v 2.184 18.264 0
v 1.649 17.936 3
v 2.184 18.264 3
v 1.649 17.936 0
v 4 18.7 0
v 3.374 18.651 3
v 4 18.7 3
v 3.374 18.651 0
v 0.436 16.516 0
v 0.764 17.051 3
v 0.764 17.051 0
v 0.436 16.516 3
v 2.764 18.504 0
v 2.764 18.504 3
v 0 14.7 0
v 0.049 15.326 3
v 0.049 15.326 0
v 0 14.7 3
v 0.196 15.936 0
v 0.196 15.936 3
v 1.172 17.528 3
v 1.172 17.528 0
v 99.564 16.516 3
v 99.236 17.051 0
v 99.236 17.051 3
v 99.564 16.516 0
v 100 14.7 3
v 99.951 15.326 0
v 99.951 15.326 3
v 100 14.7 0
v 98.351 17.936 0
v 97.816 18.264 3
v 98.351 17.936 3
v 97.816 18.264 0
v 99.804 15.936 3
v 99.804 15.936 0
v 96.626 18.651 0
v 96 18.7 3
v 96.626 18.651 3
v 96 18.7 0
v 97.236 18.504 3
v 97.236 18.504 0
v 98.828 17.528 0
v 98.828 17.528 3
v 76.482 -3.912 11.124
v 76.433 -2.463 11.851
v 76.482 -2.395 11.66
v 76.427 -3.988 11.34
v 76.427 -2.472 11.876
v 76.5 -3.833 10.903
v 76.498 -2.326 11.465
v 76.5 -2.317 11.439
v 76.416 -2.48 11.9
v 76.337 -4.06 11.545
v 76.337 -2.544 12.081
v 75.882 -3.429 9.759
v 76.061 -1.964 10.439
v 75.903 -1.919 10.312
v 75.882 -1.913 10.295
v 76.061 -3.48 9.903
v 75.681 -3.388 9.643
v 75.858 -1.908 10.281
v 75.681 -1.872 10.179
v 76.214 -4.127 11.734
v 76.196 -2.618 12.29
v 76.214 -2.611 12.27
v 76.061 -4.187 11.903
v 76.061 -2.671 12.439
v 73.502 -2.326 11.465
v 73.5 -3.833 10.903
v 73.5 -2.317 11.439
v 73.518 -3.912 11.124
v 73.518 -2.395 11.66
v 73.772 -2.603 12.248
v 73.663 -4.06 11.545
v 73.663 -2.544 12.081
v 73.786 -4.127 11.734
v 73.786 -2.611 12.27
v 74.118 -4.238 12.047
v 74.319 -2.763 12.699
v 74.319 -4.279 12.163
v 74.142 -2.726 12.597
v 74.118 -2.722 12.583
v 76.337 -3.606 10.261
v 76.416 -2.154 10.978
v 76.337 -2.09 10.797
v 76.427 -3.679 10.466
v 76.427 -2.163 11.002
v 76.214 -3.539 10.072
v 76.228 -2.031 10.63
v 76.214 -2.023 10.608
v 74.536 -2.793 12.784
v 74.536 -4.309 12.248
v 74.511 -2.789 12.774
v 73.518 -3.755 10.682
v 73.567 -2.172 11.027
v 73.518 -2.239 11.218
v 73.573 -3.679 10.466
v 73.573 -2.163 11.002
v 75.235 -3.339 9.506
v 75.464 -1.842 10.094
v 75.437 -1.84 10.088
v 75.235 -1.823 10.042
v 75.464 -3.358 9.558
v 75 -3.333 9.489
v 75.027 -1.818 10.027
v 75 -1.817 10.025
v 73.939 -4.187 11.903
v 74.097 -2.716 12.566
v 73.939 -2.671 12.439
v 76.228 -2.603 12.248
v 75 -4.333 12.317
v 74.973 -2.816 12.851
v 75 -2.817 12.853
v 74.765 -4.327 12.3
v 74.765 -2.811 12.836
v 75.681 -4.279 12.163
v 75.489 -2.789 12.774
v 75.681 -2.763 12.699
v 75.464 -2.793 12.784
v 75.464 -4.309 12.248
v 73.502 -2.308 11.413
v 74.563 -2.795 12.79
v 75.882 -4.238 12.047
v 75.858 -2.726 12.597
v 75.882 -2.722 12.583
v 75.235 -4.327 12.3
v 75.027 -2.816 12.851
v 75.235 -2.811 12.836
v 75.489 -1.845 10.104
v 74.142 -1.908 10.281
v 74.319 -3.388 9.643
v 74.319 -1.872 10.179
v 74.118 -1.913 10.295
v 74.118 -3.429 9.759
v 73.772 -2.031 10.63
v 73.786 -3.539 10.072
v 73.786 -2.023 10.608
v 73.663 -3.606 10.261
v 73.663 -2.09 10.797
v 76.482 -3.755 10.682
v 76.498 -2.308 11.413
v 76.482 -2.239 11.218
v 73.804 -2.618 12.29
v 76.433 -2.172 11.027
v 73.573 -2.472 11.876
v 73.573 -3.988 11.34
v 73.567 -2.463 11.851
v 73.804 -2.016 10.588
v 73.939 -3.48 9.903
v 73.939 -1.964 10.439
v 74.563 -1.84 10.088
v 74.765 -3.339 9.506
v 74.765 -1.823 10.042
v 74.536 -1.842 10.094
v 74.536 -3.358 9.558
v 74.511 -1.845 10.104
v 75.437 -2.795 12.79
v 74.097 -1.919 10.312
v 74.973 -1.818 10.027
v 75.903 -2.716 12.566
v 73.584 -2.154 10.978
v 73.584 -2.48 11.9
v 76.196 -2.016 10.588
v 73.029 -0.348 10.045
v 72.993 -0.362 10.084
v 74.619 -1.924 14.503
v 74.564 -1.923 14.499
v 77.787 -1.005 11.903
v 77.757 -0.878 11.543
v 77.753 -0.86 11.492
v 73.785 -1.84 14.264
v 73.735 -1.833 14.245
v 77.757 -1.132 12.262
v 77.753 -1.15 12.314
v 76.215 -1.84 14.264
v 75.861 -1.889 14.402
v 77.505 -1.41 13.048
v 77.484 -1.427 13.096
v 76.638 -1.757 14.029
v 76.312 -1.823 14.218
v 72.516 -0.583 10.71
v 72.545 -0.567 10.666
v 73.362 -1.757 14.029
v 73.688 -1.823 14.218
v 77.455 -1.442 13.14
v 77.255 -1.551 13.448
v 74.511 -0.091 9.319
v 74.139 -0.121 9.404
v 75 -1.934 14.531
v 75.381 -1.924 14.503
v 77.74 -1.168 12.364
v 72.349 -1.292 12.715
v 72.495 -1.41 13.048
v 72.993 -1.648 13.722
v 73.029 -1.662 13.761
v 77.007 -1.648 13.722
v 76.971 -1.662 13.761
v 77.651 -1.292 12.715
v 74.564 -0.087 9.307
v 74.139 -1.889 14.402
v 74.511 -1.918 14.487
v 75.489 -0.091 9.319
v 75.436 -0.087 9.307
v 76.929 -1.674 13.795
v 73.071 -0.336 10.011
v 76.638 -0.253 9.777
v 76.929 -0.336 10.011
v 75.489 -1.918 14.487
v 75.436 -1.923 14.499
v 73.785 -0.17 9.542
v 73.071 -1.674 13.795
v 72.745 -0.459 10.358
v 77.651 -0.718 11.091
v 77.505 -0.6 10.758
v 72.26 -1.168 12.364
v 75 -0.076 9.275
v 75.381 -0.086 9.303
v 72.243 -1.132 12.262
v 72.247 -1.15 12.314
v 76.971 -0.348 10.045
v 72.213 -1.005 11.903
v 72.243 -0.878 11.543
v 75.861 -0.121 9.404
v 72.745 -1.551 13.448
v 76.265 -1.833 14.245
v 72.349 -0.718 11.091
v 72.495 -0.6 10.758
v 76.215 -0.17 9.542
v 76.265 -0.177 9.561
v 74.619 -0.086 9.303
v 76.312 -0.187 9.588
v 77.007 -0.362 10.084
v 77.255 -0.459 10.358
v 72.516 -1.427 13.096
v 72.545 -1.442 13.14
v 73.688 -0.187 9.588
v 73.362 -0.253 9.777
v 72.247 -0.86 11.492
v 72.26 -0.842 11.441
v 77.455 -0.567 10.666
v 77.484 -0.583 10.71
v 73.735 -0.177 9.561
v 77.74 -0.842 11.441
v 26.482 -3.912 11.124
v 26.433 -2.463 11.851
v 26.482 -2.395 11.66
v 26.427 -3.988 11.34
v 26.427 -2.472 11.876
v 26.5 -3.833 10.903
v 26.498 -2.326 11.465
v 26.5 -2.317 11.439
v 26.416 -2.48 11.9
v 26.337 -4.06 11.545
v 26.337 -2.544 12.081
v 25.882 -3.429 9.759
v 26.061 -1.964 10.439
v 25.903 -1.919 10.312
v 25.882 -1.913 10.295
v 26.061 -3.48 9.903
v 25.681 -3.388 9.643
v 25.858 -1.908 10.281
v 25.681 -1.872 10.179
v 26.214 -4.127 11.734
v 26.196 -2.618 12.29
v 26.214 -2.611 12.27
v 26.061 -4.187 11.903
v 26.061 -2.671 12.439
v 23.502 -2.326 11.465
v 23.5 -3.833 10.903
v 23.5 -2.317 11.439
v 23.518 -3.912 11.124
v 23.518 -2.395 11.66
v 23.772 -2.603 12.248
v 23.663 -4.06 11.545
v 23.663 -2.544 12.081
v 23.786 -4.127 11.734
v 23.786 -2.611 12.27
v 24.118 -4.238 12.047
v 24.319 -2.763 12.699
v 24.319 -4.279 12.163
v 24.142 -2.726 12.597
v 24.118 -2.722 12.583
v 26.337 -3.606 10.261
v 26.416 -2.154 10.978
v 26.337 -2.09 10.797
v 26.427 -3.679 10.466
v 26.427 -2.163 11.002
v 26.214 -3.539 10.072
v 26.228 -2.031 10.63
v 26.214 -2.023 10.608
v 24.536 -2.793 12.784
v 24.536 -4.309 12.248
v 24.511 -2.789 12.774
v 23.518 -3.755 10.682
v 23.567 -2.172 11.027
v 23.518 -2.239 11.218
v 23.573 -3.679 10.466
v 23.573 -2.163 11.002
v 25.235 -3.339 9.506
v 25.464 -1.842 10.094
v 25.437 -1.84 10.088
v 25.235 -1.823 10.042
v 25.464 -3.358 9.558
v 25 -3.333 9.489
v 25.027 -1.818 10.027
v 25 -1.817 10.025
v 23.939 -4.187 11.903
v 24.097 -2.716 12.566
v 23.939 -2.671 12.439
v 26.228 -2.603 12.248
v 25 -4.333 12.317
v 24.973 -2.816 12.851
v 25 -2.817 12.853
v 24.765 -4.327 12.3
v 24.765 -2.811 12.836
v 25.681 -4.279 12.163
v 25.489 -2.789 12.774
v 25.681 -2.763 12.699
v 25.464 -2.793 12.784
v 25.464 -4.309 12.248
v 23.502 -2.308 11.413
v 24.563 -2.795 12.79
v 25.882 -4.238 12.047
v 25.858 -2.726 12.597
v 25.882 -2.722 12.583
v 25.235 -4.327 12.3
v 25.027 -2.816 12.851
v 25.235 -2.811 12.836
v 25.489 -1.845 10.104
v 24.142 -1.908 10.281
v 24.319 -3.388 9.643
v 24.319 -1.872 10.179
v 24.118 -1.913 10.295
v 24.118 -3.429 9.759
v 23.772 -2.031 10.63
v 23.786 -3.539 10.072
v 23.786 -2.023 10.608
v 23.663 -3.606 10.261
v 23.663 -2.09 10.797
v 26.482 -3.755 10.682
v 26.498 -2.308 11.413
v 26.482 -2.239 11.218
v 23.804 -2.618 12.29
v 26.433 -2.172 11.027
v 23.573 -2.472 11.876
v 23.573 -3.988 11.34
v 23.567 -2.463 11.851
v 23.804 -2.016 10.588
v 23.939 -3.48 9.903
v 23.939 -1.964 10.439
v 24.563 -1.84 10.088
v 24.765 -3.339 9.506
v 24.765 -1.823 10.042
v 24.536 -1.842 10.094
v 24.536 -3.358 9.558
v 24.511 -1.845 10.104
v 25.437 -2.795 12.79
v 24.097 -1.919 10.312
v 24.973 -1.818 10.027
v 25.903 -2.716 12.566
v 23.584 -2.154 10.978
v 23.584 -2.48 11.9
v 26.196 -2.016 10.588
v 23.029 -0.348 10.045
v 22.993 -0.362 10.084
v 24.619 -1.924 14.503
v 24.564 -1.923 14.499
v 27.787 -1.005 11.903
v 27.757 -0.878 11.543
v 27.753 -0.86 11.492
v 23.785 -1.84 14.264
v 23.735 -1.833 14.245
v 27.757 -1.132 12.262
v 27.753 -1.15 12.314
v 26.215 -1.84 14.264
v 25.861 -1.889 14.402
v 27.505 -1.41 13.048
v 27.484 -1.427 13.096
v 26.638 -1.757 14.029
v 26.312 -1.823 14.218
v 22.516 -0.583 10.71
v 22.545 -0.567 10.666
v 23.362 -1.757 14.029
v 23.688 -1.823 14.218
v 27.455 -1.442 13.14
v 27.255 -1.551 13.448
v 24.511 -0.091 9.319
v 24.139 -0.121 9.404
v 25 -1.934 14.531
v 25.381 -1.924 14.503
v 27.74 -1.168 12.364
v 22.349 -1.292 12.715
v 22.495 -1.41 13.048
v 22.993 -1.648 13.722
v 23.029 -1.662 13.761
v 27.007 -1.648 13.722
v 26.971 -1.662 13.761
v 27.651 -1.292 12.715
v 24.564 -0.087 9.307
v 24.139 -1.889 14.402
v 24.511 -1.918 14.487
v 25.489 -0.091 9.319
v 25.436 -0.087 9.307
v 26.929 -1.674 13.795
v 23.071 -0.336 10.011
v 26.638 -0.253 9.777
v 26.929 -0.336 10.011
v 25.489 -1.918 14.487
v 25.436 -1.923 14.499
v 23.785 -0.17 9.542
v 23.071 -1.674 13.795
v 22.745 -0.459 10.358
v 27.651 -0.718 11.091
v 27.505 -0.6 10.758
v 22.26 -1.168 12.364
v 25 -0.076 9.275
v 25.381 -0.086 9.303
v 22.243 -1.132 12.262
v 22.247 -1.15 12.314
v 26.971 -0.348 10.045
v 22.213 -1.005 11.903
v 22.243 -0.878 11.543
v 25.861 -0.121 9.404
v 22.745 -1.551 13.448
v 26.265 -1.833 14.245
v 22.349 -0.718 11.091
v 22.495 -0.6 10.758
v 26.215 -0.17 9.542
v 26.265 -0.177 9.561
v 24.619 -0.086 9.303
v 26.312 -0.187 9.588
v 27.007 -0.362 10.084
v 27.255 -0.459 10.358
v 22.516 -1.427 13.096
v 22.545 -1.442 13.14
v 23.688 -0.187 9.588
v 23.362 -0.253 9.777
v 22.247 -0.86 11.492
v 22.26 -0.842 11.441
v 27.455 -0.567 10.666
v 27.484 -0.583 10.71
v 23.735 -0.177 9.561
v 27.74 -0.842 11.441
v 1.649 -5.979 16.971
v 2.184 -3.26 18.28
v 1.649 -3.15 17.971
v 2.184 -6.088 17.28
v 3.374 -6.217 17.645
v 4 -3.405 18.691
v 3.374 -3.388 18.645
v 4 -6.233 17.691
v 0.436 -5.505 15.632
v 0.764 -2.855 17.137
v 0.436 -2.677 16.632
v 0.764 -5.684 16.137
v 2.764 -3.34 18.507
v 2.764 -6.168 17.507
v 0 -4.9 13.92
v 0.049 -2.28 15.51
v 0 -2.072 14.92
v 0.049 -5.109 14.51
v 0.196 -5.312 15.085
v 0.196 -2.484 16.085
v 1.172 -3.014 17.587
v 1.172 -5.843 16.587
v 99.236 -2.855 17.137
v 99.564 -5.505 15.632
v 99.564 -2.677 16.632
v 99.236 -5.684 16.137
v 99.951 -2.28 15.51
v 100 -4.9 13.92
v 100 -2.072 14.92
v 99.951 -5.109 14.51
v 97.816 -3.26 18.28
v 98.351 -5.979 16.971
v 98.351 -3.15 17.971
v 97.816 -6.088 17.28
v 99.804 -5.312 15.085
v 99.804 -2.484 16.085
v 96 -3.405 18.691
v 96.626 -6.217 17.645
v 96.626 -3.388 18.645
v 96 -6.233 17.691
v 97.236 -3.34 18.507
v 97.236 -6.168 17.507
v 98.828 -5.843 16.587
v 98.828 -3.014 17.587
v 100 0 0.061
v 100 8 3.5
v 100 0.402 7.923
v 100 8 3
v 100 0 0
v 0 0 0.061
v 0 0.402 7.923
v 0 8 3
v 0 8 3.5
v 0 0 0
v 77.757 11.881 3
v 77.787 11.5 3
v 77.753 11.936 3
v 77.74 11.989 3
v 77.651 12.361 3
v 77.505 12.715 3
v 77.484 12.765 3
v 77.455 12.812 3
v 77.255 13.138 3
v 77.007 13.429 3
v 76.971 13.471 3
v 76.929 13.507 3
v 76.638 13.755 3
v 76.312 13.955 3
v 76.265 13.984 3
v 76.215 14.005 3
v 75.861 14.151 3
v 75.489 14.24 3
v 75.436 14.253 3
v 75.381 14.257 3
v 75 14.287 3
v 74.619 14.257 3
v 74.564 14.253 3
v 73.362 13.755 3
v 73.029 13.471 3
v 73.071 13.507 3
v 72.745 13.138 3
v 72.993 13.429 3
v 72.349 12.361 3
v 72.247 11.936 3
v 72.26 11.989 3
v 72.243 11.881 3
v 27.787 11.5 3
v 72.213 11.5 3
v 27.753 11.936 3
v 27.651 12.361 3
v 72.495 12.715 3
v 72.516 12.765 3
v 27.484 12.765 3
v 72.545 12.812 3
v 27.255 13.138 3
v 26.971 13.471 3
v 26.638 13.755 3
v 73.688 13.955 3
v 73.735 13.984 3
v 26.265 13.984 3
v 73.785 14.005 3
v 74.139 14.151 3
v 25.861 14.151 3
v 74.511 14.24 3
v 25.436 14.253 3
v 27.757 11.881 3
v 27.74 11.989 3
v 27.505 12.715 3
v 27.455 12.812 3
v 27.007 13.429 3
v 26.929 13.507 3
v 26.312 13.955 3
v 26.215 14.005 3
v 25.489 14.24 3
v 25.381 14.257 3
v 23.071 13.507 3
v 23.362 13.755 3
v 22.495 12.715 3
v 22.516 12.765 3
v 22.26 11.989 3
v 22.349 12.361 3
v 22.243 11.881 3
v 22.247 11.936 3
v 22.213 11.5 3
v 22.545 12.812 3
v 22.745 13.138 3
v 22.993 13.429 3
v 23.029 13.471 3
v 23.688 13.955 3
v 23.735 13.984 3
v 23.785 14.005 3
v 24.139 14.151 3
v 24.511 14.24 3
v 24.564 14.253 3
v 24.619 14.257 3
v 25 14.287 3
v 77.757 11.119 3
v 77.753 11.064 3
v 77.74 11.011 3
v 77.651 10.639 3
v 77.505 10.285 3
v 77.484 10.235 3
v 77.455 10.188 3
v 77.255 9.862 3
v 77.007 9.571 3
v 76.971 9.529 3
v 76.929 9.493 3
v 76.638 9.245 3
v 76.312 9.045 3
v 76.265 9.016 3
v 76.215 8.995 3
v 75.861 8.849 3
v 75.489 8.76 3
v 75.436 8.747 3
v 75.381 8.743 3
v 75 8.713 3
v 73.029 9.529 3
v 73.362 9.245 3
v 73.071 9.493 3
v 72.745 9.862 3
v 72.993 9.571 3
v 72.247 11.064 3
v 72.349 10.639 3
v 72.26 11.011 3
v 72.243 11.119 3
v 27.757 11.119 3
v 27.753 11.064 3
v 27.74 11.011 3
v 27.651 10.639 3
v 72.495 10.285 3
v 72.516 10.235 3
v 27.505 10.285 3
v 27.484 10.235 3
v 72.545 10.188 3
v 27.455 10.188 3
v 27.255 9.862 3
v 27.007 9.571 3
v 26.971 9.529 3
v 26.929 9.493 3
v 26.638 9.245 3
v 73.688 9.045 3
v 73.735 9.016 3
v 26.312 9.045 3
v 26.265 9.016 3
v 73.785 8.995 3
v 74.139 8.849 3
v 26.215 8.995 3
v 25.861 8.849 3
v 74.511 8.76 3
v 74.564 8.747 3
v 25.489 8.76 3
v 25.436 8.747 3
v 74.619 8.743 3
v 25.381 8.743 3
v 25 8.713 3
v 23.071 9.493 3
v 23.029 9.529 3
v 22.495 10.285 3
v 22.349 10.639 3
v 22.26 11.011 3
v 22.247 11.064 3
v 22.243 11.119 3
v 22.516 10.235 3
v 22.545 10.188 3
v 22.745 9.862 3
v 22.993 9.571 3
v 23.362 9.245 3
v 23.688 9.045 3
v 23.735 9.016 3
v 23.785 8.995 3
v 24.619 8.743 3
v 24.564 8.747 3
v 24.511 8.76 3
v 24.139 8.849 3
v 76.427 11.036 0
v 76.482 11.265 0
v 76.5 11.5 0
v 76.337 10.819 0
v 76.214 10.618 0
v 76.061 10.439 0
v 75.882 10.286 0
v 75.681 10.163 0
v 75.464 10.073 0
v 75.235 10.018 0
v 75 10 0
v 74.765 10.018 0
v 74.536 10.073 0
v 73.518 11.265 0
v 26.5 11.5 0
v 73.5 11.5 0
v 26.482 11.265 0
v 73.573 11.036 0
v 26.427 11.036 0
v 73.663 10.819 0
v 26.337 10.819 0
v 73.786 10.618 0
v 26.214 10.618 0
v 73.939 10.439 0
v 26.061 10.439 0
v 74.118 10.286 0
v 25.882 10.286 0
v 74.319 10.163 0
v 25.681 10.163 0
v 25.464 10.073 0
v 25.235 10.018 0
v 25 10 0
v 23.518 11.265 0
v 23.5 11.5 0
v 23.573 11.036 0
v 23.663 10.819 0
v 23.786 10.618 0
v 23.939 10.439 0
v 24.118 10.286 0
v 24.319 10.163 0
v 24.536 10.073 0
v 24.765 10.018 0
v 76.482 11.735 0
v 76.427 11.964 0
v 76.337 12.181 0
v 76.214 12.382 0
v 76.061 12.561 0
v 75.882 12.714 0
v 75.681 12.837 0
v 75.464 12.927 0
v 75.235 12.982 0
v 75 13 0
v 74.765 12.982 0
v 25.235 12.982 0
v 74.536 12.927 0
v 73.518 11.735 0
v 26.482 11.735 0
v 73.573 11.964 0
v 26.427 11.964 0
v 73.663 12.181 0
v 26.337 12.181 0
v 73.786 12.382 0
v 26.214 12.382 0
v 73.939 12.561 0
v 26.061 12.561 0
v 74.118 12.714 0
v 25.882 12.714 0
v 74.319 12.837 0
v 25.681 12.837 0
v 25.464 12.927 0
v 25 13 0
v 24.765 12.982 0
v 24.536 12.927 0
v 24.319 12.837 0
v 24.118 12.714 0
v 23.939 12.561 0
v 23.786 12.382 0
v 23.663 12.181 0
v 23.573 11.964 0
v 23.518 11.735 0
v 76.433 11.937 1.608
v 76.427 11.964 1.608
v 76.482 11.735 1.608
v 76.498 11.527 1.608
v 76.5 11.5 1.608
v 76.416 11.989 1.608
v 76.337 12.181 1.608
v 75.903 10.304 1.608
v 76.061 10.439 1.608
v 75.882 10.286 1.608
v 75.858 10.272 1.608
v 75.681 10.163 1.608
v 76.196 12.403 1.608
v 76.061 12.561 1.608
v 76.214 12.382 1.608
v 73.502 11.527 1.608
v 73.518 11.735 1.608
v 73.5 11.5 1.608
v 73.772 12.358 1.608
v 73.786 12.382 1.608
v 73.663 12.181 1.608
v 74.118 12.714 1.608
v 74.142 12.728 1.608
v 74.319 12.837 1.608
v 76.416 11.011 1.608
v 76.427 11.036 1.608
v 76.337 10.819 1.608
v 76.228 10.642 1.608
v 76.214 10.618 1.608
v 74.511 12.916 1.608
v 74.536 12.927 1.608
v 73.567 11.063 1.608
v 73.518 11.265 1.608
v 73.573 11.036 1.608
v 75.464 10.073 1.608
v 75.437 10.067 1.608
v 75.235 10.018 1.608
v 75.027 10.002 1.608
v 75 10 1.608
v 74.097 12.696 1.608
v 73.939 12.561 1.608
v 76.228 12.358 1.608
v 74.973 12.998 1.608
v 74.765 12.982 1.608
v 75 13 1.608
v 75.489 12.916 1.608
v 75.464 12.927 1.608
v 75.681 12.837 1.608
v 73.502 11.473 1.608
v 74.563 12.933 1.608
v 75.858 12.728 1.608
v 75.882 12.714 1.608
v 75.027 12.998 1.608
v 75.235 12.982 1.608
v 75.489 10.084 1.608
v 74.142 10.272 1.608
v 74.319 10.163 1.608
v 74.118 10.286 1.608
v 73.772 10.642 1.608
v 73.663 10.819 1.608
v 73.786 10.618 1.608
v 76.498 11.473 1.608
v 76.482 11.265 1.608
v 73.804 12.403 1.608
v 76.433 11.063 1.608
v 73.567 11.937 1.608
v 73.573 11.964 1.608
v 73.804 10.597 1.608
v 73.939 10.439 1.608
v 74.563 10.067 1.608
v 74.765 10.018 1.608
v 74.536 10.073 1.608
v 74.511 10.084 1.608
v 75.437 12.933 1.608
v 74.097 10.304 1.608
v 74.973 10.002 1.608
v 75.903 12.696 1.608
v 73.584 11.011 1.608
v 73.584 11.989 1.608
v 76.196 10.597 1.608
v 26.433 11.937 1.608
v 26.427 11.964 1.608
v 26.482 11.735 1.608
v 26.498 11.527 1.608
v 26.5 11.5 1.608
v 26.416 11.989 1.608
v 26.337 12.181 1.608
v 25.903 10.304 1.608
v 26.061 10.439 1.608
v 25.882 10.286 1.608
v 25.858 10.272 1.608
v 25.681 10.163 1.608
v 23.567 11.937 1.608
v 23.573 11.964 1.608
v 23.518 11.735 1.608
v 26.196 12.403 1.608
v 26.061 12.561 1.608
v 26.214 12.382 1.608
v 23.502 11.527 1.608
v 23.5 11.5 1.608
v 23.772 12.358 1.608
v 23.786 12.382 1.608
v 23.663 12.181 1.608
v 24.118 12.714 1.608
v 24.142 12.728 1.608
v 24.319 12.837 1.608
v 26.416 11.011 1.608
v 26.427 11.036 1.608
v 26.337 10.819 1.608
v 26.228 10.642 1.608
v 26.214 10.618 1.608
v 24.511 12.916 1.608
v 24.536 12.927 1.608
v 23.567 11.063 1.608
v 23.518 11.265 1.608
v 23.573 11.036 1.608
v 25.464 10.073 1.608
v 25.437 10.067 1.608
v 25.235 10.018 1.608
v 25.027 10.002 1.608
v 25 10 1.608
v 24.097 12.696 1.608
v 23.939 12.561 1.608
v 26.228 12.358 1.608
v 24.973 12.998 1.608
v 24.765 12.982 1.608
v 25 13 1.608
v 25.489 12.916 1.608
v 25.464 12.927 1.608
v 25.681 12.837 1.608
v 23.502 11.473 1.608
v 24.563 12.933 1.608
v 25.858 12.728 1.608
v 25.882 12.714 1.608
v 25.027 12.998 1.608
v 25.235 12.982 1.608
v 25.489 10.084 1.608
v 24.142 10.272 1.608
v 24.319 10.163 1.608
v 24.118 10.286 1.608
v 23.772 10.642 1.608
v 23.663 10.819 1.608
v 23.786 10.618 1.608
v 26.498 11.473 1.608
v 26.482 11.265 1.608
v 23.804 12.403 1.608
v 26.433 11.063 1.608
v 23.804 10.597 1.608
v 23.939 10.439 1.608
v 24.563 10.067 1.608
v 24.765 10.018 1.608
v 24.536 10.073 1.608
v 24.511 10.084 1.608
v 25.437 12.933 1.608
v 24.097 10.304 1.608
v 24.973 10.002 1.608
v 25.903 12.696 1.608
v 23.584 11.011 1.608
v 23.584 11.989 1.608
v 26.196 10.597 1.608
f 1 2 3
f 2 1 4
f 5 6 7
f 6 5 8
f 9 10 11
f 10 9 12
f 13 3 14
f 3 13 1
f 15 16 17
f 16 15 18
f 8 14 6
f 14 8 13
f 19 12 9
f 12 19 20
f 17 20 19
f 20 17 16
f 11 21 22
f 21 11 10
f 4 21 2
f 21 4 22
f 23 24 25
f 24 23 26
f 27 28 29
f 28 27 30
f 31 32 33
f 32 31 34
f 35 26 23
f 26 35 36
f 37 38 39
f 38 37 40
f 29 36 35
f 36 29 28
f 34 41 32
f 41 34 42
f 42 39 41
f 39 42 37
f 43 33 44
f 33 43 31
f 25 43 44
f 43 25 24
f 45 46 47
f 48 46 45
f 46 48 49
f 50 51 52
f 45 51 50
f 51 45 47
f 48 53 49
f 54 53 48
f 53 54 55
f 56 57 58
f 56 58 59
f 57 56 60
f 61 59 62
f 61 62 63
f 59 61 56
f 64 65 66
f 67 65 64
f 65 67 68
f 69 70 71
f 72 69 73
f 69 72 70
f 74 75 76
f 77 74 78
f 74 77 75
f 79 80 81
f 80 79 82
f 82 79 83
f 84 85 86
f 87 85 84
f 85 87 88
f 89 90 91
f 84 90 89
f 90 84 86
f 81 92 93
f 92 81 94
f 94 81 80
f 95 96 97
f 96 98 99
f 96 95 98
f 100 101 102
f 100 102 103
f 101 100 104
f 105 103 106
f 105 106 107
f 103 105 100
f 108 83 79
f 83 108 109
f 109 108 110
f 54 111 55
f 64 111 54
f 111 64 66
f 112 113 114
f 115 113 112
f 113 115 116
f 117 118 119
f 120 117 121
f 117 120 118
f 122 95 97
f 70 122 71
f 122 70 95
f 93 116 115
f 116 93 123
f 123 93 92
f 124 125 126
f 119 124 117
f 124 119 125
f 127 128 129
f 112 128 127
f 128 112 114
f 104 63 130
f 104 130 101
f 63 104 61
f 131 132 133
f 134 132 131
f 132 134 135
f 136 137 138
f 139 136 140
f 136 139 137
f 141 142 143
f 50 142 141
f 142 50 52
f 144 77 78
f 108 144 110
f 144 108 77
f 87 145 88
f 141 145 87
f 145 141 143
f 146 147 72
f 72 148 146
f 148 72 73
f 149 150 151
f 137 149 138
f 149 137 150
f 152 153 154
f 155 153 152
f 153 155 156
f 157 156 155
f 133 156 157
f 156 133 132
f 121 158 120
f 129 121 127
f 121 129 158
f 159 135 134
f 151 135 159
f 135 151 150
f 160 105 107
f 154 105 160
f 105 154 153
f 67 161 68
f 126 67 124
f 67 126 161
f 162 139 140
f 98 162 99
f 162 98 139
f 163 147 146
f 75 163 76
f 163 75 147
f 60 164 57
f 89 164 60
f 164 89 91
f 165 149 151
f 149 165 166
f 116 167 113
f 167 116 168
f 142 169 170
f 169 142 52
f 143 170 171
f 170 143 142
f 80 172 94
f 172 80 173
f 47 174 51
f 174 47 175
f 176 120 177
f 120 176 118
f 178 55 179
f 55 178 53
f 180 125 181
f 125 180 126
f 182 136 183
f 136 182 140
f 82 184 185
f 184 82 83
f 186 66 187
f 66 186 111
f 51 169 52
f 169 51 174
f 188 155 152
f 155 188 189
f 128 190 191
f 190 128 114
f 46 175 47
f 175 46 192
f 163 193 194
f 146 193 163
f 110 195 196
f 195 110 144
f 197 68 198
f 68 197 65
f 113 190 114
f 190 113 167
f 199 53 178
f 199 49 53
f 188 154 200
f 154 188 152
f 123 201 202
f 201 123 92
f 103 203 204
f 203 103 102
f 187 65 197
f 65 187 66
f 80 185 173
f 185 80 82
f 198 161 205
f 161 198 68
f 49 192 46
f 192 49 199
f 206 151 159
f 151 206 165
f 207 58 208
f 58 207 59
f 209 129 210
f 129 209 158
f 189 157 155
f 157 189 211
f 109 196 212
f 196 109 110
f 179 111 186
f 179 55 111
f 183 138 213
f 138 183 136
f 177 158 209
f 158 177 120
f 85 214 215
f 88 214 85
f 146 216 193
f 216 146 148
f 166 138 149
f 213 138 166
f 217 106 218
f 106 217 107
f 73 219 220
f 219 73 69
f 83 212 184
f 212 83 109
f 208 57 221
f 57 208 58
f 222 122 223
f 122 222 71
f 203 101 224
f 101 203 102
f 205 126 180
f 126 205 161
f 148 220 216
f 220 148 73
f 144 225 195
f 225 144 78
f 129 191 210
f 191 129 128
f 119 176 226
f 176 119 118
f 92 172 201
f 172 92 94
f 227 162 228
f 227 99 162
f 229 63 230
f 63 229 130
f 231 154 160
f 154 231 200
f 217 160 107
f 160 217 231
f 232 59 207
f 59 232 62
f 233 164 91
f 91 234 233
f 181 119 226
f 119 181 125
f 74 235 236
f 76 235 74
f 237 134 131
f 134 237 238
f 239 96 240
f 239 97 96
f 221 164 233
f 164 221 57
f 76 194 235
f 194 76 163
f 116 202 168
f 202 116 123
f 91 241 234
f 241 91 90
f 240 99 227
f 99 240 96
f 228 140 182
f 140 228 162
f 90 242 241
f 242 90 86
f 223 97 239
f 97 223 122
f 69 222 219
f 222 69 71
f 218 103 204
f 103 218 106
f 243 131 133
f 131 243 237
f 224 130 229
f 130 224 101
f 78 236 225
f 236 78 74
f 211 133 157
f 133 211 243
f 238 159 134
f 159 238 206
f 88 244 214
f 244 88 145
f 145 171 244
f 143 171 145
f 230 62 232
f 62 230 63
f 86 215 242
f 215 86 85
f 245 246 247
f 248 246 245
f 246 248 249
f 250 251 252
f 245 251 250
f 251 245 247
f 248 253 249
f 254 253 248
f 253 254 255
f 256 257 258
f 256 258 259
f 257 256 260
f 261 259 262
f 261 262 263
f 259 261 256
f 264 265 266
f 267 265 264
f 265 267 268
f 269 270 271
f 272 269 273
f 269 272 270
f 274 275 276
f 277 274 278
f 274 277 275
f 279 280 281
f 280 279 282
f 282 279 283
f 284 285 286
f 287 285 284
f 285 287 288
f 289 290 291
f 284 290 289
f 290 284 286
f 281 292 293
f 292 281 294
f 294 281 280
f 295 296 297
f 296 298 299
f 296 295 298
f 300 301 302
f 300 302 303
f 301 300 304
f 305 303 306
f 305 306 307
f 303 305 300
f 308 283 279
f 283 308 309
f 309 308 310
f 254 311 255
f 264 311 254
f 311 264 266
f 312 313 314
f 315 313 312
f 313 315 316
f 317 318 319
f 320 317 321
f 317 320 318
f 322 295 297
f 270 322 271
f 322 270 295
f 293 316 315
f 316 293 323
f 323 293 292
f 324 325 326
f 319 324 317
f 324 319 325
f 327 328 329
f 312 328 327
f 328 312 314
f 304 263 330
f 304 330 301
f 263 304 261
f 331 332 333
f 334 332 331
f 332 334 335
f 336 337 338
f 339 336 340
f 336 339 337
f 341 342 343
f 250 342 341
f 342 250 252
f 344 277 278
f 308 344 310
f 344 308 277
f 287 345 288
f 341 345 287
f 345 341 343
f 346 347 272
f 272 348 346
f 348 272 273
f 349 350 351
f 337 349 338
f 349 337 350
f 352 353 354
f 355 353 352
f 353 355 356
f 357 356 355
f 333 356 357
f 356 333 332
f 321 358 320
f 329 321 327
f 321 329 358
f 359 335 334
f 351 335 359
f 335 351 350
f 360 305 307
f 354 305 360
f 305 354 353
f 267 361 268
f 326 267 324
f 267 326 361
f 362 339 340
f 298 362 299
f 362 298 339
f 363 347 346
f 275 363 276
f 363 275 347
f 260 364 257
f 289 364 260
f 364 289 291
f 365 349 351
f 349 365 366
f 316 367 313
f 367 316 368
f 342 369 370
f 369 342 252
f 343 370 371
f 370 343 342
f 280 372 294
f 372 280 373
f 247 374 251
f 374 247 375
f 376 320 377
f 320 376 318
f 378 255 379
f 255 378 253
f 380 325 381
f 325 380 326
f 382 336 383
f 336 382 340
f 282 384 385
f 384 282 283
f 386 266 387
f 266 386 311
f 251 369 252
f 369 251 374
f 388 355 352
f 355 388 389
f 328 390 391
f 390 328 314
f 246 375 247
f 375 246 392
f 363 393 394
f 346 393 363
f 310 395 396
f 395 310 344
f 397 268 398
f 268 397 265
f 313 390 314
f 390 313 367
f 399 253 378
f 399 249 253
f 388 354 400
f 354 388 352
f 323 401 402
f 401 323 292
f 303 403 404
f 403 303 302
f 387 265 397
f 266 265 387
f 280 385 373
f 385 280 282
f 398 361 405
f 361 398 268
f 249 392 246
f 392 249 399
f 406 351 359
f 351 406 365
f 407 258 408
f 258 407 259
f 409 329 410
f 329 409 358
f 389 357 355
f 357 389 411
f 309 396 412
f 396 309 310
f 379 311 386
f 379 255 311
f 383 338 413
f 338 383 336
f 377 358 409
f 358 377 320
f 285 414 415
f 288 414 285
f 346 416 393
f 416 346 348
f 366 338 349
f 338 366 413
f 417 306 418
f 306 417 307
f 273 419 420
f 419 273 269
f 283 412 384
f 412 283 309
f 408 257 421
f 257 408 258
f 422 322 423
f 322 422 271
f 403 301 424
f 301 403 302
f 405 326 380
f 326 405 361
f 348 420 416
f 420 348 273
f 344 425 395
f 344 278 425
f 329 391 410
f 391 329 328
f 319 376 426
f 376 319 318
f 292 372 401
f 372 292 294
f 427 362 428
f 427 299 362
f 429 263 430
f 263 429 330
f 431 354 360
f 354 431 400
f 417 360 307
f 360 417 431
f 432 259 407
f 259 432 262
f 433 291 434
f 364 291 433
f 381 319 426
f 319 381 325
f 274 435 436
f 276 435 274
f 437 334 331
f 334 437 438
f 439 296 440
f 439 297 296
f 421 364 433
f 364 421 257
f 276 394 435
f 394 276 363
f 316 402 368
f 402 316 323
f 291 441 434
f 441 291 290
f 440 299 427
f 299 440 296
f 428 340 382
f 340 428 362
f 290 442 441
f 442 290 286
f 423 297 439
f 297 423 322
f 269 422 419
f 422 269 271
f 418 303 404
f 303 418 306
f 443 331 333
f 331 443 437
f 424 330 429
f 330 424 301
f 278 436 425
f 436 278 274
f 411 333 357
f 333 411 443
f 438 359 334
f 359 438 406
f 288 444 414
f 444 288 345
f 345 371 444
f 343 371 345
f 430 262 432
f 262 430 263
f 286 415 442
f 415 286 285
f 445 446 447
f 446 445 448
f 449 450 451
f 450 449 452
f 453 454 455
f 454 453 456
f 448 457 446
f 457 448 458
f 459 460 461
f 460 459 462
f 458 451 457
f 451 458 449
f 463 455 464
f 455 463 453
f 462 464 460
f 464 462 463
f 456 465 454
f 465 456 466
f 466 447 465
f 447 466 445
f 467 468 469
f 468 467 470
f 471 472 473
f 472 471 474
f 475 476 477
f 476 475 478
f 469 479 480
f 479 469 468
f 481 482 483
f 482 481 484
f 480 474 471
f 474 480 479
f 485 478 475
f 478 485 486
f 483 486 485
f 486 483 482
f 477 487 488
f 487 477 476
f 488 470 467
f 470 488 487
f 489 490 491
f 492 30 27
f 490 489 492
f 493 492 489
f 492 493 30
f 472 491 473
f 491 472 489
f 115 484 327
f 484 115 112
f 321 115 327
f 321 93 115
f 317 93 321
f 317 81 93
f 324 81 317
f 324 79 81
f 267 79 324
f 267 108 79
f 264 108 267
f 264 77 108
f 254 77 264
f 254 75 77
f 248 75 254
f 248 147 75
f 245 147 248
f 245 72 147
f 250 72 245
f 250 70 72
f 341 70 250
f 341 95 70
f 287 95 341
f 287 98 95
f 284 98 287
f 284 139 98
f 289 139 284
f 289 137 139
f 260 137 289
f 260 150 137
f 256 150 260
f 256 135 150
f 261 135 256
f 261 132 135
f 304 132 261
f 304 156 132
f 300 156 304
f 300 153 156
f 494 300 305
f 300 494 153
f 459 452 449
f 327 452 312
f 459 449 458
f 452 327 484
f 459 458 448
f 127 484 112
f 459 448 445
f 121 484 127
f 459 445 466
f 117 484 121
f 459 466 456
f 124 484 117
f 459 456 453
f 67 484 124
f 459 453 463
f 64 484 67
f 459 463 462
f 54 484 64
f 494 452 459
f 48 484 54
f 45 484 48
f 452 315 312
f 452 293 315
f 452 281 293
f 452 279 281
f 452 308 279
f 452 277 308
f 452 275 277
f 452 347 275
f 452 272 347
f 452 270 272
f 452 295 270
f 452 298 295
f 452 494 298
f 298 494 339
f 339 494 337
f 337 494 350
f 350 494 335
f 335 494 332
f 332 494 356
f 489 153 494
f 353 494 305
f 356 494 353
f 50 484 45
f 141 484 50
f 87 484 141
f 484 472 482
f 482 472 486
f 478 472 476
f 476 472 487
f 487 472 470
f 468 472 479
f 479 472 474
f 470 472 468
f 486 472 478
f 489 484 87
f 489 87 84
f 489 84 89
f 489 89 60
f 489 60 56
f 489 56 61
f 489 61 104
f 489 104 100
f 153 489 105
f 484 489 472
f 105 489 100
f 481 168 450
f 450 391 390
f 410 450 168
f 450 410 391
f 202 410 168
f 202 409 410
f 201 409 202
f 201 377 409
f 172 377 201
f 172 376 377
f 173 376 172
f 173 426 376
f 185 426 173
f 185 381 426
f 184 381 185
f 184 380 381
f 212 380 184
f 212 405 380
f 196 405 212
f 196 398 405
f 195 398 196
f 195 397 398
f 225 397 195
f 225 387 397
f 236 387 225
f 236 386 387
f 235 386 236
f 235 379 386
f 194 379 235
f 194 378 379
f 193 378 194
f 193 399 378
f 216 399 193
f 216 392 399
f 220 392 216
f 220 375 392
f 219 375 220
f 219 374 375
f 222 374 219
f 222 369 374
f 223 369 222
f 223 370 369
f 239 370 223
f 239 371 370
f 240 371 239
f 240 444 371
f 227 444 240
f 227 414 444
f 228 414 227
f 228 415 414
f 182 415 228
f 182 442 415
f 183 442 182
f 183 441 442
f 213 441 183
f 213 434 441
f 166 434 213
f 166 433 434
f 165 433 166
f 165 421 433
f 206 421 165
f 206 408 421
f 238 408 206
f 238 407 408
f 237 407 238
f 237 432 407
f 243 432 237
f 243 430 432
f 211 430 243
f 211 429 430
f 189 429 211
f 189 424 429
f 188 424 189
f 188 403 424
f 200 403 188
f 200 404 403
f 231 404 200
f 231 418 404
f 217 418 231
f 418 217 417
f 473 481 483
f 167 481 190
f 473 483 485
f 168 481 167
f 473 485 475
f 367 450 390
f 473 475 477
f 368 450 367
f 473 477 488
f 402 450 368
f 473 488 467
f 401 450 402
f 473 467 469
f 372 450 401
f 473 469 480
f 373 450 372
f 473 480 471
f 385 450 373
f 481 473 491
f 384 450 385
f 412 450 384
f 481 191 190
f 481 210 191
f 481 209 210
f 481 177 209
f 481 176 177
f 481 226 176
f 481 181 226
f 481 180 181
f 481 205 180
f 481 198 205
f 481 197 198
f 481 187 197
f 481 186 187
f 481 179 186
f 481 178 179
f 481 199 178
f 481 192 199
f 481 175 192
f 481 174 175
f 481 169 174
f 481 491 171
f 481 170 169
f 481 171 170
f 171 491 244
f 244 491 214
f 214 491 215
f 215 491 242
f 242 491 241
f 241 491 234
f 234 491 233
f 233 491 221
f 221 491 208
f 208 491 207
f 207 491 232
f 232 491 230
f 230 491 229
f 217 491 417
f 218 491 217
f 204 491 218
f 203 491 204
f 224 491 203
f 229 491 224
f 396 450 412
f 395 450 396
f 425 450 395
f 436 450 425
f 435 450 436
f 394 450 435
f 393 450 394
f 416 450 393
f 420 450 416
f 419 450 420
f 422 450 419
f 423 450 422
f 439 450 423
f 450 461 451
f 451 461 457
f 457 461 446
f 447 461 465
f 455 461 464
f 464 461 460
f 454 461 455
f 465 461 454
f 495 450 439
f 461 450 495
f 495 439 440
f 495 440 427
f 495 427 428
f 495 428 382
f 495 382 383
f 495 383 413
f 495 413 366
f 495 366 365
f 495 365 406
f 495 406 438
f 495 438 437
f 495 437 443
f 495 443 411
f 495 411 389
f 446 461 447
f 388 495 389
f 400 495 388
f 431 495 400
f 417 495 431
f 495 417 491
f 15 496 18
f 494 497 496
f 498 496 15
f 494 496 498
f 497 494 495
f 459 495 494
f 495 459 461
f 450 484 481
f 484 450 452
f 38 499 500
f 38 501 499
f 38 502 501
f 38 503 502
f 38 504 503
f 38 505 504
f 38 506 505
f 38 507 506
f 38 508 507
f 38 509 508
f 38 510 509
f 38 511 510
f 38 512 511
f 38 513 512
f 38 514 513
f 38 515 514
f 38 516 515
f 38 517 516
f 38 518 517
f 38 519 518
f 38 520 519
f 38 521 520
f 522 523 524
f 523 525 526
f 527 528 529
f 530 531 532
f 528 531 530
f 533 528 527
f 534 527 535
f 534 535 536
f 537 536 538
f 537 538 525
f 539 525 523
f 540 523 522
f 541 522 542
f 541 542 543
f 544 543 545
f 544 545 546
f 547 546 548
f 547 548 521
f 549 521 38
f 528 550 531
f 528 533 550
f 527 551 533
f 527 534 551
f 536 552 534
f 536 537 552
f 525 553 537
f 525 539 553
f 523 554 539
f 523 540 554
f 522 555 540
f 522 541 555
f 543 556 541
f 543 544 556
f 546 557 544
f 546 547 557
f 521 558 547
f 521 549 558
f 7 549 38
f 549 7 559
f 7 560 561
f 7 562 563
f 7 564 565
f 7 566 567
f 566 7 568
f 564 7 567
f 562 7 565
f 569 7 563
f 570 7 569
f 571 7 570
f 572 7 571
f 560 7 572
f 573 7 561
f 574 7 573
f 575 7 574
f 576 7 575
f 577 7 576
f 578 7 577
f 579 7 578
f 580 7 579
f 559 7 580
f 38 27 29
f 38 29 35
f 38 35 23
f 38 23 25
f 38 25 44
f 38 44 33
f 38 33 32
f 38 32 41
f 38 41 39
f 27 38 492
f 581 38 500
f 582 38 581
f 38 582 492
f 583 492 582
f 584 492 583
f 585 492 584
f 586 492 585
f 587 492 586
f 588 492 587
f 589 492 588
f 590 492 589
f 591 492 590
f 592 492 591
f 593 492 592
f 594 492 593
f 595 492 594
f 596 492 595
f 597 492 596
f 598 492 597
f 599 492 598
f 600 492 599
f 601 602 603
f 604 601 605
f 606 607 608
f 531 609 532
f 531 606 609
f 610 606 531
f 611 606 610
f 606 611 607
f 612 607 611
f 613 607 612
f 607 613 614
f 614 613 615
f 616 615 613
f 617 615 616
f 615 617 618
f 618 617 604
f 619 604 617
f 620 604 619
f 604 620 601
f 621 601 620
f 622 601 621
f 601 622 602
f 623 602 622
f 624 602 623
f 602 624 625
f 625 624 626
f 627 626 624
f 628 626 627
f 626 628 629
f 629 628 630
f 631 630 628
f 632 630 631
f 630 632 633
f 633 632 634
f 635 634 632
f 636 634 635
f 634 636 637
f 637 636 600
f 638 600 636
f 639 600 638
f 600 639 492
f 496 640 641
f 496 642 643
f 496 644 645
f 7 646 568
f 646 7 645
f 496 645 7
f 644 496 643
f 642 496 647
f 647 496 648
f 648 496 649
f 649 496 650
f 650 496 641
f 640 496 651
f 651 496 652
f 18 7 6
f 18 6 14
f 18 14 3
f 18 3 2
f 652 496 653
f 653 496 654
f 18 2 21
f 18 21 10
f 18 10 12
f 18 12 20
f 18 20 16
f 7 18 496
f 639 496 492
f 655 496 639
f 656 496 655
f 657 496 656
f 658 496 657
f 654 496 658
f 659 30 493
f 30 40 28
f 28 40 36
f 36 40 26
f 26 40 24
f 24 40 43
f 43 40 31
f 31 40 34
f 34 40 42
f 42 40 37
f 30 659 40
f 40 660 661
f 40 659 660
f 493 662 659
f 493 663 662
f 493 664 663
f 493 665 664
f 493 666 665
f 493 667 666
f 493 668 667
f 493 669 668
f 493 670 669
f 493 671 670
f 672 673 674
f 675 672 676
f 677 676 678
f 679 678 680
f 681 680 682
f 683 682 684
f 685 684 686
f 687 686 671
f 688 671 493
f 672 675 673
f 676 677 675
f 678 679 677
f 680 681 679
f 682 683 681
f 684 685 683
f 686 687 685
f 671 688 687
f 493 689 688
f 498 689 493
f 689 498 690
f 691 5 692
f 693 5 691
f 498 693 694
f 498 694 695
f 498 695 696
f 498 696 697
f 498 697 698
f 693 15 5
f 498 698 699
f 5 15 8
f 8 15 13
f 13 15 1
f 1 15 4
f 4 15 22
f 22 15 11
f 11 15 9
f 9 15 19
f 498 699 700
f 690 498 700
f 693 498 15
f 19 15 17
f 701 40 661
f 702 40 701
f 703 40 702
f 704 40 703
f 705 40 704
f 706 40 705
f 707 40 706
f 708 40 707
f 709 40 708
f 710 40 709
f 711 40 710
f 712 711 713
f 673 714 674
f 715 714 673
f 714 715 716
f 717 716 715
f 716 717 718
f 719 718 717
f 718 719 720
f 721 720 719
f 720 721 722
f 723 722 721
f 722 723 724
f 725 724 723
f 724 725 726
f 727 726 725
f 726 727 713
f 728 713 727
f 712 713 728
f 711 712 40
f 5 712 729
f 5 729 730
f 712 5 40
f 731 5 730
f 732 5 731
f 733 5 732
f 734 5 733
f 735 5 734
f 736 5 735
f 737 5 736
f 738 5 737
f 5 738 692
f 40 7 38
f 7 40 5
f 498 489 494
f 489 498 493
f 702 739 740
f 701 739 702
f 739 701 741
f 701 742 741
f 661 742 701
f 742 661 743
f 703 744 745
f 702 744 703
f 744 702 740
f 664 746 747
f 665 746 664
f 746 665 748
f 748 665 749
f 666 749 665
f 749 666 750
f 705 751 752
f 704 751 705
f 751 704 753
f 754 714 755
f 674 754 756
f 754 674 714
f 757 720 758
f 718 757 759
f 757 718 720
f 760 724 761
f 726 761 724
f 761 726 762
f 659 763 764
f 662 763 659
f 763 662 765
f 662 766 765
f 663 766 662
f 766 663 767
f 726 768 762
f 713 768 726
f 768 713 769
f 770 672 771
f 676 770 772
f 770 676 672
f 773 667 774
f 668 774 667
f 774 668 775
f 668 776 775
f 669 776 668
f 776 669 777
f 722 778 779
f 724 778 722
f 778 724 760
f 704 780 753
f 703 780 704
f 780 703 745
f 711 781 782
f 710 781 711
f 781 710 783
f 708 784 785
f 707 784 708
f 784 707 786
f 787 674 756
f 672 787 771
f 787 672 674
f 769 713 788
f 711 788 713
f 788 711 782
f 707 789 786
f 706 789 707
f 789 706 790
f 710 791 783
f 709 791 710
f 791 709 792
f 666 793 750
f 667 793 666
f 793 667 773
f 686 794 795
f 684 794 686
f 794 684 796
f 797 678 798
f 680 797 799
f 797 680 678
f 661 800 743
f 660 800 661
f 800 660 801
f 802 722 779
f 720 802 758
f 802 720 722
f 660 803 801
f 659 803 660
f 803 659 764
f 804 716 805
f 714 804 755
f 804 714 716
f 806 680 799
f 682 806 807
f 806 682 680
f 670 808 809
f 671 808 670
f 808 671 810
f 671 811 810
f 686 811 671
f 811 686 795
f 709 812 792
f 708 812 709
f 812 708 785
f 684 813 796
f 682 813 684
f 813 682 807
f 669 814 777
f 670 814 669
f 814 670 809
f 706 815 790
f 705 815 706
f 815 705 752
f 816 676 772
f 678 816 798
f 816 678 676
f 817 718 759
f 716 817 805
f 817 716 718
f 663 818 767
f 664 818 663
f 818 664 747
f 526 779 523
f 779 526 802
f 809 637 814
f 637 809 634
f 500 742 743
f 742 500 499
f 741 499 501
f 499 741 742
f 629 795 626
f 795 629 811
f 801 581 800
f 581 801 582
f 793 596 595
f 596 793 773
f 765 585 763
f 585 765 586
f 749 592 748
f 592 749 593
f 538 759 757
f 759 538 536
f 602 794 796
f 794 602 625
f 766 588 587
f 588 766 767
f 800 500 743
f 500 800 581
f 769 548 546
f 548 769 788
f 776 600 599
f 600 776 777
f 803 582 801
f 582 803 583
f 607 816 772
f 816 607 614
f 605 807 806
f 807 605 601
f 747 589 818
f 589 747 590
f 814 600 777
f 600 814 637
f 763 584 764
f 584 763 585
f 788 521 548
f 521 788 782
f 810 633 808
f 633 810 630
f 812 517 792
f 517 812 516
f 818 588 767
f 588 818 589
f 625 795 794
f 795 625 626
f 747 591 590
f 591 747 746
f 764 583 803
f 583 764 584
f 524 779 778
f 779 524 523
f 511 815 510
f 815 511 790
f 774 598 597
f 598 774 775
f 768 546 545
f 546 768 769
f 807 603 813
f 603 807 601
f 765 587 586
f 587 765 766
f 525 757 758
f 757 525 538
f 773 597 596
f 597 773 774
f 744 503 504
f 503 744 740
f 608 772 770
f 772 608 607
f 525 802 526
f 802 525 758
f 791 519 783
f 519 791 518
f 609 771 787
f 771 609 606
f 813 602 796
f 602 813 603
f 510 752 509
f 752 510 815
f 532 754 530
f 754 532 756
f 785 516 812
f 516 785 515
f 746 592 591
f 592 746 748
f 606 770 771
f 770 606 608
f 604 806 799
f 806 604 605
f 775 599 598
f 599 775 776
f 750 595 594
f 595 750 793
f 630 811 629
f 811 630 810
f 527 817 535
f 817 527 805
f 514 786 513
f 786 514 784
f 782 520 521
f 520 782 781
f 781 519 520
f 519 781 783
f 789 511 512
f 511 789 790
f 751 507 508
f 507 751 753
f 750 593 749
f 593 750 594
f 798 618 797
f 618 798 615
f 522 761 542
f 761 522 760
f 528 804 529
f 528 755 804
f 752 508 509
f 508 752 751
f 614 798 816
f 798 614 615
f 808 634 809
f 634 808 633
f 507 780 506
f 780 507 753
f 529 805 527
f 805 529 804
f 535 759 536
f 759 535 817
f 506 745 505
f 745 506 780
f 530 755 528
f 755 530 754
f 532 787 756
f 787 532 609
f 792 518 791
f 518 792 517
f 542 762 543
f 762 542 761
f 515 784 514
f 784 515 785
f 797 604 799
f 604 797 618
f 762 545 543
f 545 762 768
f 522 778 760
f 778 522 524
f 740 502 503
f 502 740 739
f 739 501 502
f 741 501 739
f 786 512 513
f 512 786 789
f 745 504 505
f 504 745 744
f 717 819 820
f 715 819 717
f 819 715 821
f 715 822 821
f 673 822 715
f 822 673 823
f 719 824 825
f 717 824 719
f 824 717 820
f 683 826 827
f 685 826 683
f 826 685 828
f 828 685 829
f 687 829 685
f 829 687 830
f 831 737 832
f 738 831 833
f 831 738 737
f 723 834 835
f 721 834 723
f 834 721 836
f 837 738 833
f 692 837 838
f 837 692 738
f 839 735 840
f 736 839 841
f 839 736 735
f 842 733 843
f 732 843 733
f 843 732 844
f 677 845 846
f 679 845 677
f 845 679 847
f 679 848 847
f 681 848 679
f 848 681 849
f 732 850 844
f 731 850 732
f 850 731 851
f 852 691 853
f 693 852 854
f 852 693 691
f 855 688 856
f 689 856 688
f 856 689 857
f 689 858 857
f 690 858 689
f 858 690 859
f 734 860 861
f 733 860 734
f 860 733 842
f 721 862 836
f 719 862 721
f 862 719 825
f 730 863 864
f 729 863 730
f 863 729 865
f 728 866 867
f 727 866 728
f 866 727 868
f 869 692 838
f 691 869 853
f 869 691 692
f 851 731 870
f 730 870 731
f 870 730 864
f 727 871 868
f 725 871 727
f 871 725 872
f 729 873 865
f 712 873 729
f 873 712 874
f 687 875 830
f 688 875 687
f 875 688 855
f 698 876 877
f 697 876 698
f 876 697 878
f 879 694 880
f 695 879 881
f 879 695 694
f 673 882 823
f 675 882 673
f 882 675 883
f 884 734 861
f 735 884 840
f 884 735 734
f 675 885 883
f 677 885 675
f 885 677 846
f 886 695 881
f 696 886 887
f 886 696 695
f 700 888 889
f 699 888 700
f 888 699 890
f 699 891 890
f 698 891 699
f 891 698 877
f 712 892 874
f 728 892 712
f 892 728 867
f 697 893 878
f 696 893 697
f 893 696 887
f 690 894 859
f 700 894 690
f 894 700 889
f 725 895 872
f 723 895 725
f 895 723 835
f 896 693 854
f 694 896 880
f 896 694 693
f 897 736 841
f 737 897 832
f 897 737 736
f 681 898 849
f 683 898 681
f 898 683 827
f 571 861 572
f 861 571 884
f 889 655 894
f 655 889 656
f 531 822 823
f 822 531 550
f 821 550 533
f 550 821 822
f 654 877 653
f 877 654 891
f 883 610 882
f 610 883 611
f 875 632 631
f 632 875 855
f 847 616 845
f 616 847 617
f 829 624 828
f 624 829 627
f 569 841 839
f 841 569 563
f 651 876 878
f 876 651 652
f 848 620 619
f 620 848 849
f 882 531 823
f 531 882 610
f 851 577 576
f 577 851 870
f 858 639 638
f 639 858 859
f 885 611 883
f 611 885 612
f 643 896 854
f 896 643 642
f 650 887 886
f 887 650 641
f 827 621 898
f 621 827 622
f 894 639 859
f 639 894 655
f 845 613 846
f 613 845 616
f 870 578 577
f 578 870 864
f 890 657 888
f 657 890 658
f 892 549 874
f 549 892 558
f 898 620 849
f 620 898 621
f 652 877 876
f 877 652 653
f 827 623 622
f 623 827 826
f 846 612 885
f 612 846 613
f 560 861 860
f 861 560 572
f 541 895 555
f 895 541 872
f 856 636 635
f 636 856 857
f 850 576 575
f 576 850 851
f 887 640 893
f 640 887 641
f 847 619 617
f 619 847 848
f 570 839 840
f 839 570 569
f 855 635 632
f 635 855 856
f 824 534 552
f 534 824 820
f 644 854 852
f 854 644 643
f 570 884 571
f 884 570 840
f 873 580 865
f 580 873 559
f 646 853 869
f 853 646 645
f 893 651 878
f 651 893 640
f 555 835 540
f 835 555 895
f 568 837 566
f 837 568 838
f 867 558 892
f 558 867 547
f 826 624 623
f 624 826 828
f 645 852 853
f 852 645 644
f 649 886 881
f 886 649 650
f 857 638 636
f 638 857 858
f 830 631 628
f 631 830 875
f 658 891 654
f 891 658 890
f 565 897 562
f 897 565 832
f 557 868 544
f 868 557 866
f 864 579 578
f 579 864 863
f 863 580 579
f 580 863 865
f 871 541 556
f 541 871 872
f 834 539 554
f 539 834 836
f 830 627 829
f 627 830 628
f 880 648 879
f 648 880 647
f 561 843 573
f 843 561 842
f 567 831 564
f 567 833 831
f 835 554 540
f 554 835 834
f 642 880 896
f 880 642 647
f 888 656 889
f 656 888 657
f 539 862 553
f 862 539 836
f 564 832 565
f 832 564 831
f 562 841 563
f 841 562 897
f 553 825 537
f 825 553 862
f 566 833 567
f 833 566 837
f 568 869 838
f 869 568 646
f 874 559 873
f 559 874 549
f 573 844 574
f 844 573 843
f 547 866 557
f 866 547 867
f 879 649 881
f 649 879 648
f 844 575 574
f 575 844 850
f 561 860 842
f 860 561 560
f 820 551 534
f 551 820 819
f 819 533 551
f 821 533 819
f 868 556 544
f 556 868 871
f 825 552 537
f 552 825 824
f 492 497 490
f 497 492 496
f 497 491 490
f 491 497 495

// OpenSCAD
$fn=40;
OUTER_WALL_TN = 2;
WID = 17;
FACET_ANGLE = 70.5288;
FRAME_PLATE_TN = 3;
FRAME_PLATE_LN = 100;

UNDER_NOODLE_SZ = 6;

CS_ANGLE_RATIO = (5.6 -3) / 1.6;
CS_MIN_RAD = 2.8/2;
CS_HT = 2;
cs_max_rad = CS_HT * CS_ANGLE_RATIO;
cs_plate_wid = WID * 1.1;

module m3_countersink(){
    cylinder(h=CS_HT, r1 = CS_MIN_RAD,r2=cs_max_rad );
}


module corner_trimmer(){
    difference() {
        cube([5,5,FRAME_PLATE_TN*1.1],center=true);
        translate([2.5,2.5,-2]){
            cylinder(r=4,h=FRAME_PLATE_TN*1.5);
        }
    }
}
//corner_trimmer();

module screw_plate(){
    difference(){
        union(){
            cube([FRAME_PLATE_LN, cs_plate_wid, FRAME_PLATE_TN]);
            

            translate([0,cos(90-FACET_ANGLE) * FRAME_PLATE_TN,tan(90-FACET_ANGLE)*FRAME_PLATE_TN]){
                rotate([180 - FACET_ANGLE,0,0]){
                    difference(){
                        union(){
                            cube([FRAME_PLATE_LN, cs_plate_wid, FRAME_PLATE_TN]);
                            
                        }
                        // screwholes on upright side
                        translate([FRAME_PLATE_LN-(FRAME_PLATE_LN/2 - 25),10 + OUTER_WALL_TN * 0.75,-1]){
                            cylinder(h=6, r=3/2);
                            translate([0,0,2.5]){
                                rotate([180,0,0]){
                                    m3_countersink();
                                }
                            }
                        }
                        translate([(FRAME_PLATE_LN/2 - 25),10 + 0.75* OUTER_WALL_TN,-1]){
                            cylinder(h=6, r=3/2);
                            translate([0,0,2.5]){
                                rotate([180,0,0]){
                                    m3_countersink();
                                }
                            }
                        }
                        // trim the corners
                        translate([1.5,cs_plate_wid-1.5,1.5]){ 
                            rotate([0,0,270]){
                                corner_trimmer();
                            }
                        }
                        // trim the corners
                        translate([FRAME_PLATE_LN-1.5,cs_plate_wid-1.5,1.5]){ 
                            rotate([0,0,180]){
                                corner_trimmer();
                            }
                        }

                    }
                }
            }
        }
        // screwholes on flat side
        translate([FRAME_PLATE_LN-(FRAME_PLATE_LN/2 - 25),10 + 0.75* OUTER_WALL_TN,-1]){
            cylinder(h=6, r=3/2);
            translate([0,0,2.5]){
                m3_countersink();
            }
        }
        translate([(FRAME_PLATE_LN/2 - 25),10 + 0.75* OUTER_WALL_TN,-1]){
            cylinder(h=6, r=3/2);
            translate([0,0,2.5]){
                m3_countersink();
            }
        }
        // trim the corners
        translate([1.5,cs_plate_wid - 1.5,1.5]){ 
            rotate([0,0,-90]){
                corner_trimmer();
            }
        }
        // trim the corners
        translate([FRAME_PLATE_LN-1.5,cs_plate_wid - 1.5,1.5]){ 
            rotate([0,0,180]){
                corner_trimmer();
            }
        }
    }

    translate([0,2,2.5]){ 
        hull(){
            cube([FRAME_PLATE_LN, UNDER_NOODLE_SZ,1]);
            rotate([180 - FACET_ANGLE,0,0]){
                        difference(){
                            cube([FRAME_PLATE_LN, UNDER_NOODLE_SZ, 1]);
                        }
            }
        }
    }
}
screw_plate();


// // veins
// translate([FRAME_PLATE_LN -5 ,cs_plate_wid -5 ,FRAME_PLATE_TN-1]){ 
//     rotate([90,0,0]){
//         rotate_extrude(angle=90) {
//             translate([2,0,0]){
//                 circle(r = 1.5);
//             } 
//         }
//     }
// }

// translate([FRAME_PLATE_LN -5 ,cs_plate_wid -20 ,FRAME_PLATE_TN + 1]){ 
//     rotate([0,0,90]){
//         rotate_extrude(angle=45) {
//             translate([15,0,0]){
//                 circle(r = 1.5);
//             } 
//         }
//     }
// }

// translate([FRAME_PLATE_LN -28 ,cs_plate_wid - 3  ,FRAME_PLATE_TN + 6]){ 
//     rotate([-20,0,-105]){
//         rotate_extrude(angle=80) {
//             translate([15,0,0]){
//                 circle(r = 1.5);
//             } 
//         }
//     }
// }


// translate([FRAME_PLATE_LN/2 + 4.8 ,2*cs_plate_wid +36  ,-5]){ 
//     rotate([10,-5,-124]){
//         rotate_extrude(angle=45) {
//             translate([75,0,0]){
//                 circle(r = 1.5);
//             } 
//         }
//     }
// }
